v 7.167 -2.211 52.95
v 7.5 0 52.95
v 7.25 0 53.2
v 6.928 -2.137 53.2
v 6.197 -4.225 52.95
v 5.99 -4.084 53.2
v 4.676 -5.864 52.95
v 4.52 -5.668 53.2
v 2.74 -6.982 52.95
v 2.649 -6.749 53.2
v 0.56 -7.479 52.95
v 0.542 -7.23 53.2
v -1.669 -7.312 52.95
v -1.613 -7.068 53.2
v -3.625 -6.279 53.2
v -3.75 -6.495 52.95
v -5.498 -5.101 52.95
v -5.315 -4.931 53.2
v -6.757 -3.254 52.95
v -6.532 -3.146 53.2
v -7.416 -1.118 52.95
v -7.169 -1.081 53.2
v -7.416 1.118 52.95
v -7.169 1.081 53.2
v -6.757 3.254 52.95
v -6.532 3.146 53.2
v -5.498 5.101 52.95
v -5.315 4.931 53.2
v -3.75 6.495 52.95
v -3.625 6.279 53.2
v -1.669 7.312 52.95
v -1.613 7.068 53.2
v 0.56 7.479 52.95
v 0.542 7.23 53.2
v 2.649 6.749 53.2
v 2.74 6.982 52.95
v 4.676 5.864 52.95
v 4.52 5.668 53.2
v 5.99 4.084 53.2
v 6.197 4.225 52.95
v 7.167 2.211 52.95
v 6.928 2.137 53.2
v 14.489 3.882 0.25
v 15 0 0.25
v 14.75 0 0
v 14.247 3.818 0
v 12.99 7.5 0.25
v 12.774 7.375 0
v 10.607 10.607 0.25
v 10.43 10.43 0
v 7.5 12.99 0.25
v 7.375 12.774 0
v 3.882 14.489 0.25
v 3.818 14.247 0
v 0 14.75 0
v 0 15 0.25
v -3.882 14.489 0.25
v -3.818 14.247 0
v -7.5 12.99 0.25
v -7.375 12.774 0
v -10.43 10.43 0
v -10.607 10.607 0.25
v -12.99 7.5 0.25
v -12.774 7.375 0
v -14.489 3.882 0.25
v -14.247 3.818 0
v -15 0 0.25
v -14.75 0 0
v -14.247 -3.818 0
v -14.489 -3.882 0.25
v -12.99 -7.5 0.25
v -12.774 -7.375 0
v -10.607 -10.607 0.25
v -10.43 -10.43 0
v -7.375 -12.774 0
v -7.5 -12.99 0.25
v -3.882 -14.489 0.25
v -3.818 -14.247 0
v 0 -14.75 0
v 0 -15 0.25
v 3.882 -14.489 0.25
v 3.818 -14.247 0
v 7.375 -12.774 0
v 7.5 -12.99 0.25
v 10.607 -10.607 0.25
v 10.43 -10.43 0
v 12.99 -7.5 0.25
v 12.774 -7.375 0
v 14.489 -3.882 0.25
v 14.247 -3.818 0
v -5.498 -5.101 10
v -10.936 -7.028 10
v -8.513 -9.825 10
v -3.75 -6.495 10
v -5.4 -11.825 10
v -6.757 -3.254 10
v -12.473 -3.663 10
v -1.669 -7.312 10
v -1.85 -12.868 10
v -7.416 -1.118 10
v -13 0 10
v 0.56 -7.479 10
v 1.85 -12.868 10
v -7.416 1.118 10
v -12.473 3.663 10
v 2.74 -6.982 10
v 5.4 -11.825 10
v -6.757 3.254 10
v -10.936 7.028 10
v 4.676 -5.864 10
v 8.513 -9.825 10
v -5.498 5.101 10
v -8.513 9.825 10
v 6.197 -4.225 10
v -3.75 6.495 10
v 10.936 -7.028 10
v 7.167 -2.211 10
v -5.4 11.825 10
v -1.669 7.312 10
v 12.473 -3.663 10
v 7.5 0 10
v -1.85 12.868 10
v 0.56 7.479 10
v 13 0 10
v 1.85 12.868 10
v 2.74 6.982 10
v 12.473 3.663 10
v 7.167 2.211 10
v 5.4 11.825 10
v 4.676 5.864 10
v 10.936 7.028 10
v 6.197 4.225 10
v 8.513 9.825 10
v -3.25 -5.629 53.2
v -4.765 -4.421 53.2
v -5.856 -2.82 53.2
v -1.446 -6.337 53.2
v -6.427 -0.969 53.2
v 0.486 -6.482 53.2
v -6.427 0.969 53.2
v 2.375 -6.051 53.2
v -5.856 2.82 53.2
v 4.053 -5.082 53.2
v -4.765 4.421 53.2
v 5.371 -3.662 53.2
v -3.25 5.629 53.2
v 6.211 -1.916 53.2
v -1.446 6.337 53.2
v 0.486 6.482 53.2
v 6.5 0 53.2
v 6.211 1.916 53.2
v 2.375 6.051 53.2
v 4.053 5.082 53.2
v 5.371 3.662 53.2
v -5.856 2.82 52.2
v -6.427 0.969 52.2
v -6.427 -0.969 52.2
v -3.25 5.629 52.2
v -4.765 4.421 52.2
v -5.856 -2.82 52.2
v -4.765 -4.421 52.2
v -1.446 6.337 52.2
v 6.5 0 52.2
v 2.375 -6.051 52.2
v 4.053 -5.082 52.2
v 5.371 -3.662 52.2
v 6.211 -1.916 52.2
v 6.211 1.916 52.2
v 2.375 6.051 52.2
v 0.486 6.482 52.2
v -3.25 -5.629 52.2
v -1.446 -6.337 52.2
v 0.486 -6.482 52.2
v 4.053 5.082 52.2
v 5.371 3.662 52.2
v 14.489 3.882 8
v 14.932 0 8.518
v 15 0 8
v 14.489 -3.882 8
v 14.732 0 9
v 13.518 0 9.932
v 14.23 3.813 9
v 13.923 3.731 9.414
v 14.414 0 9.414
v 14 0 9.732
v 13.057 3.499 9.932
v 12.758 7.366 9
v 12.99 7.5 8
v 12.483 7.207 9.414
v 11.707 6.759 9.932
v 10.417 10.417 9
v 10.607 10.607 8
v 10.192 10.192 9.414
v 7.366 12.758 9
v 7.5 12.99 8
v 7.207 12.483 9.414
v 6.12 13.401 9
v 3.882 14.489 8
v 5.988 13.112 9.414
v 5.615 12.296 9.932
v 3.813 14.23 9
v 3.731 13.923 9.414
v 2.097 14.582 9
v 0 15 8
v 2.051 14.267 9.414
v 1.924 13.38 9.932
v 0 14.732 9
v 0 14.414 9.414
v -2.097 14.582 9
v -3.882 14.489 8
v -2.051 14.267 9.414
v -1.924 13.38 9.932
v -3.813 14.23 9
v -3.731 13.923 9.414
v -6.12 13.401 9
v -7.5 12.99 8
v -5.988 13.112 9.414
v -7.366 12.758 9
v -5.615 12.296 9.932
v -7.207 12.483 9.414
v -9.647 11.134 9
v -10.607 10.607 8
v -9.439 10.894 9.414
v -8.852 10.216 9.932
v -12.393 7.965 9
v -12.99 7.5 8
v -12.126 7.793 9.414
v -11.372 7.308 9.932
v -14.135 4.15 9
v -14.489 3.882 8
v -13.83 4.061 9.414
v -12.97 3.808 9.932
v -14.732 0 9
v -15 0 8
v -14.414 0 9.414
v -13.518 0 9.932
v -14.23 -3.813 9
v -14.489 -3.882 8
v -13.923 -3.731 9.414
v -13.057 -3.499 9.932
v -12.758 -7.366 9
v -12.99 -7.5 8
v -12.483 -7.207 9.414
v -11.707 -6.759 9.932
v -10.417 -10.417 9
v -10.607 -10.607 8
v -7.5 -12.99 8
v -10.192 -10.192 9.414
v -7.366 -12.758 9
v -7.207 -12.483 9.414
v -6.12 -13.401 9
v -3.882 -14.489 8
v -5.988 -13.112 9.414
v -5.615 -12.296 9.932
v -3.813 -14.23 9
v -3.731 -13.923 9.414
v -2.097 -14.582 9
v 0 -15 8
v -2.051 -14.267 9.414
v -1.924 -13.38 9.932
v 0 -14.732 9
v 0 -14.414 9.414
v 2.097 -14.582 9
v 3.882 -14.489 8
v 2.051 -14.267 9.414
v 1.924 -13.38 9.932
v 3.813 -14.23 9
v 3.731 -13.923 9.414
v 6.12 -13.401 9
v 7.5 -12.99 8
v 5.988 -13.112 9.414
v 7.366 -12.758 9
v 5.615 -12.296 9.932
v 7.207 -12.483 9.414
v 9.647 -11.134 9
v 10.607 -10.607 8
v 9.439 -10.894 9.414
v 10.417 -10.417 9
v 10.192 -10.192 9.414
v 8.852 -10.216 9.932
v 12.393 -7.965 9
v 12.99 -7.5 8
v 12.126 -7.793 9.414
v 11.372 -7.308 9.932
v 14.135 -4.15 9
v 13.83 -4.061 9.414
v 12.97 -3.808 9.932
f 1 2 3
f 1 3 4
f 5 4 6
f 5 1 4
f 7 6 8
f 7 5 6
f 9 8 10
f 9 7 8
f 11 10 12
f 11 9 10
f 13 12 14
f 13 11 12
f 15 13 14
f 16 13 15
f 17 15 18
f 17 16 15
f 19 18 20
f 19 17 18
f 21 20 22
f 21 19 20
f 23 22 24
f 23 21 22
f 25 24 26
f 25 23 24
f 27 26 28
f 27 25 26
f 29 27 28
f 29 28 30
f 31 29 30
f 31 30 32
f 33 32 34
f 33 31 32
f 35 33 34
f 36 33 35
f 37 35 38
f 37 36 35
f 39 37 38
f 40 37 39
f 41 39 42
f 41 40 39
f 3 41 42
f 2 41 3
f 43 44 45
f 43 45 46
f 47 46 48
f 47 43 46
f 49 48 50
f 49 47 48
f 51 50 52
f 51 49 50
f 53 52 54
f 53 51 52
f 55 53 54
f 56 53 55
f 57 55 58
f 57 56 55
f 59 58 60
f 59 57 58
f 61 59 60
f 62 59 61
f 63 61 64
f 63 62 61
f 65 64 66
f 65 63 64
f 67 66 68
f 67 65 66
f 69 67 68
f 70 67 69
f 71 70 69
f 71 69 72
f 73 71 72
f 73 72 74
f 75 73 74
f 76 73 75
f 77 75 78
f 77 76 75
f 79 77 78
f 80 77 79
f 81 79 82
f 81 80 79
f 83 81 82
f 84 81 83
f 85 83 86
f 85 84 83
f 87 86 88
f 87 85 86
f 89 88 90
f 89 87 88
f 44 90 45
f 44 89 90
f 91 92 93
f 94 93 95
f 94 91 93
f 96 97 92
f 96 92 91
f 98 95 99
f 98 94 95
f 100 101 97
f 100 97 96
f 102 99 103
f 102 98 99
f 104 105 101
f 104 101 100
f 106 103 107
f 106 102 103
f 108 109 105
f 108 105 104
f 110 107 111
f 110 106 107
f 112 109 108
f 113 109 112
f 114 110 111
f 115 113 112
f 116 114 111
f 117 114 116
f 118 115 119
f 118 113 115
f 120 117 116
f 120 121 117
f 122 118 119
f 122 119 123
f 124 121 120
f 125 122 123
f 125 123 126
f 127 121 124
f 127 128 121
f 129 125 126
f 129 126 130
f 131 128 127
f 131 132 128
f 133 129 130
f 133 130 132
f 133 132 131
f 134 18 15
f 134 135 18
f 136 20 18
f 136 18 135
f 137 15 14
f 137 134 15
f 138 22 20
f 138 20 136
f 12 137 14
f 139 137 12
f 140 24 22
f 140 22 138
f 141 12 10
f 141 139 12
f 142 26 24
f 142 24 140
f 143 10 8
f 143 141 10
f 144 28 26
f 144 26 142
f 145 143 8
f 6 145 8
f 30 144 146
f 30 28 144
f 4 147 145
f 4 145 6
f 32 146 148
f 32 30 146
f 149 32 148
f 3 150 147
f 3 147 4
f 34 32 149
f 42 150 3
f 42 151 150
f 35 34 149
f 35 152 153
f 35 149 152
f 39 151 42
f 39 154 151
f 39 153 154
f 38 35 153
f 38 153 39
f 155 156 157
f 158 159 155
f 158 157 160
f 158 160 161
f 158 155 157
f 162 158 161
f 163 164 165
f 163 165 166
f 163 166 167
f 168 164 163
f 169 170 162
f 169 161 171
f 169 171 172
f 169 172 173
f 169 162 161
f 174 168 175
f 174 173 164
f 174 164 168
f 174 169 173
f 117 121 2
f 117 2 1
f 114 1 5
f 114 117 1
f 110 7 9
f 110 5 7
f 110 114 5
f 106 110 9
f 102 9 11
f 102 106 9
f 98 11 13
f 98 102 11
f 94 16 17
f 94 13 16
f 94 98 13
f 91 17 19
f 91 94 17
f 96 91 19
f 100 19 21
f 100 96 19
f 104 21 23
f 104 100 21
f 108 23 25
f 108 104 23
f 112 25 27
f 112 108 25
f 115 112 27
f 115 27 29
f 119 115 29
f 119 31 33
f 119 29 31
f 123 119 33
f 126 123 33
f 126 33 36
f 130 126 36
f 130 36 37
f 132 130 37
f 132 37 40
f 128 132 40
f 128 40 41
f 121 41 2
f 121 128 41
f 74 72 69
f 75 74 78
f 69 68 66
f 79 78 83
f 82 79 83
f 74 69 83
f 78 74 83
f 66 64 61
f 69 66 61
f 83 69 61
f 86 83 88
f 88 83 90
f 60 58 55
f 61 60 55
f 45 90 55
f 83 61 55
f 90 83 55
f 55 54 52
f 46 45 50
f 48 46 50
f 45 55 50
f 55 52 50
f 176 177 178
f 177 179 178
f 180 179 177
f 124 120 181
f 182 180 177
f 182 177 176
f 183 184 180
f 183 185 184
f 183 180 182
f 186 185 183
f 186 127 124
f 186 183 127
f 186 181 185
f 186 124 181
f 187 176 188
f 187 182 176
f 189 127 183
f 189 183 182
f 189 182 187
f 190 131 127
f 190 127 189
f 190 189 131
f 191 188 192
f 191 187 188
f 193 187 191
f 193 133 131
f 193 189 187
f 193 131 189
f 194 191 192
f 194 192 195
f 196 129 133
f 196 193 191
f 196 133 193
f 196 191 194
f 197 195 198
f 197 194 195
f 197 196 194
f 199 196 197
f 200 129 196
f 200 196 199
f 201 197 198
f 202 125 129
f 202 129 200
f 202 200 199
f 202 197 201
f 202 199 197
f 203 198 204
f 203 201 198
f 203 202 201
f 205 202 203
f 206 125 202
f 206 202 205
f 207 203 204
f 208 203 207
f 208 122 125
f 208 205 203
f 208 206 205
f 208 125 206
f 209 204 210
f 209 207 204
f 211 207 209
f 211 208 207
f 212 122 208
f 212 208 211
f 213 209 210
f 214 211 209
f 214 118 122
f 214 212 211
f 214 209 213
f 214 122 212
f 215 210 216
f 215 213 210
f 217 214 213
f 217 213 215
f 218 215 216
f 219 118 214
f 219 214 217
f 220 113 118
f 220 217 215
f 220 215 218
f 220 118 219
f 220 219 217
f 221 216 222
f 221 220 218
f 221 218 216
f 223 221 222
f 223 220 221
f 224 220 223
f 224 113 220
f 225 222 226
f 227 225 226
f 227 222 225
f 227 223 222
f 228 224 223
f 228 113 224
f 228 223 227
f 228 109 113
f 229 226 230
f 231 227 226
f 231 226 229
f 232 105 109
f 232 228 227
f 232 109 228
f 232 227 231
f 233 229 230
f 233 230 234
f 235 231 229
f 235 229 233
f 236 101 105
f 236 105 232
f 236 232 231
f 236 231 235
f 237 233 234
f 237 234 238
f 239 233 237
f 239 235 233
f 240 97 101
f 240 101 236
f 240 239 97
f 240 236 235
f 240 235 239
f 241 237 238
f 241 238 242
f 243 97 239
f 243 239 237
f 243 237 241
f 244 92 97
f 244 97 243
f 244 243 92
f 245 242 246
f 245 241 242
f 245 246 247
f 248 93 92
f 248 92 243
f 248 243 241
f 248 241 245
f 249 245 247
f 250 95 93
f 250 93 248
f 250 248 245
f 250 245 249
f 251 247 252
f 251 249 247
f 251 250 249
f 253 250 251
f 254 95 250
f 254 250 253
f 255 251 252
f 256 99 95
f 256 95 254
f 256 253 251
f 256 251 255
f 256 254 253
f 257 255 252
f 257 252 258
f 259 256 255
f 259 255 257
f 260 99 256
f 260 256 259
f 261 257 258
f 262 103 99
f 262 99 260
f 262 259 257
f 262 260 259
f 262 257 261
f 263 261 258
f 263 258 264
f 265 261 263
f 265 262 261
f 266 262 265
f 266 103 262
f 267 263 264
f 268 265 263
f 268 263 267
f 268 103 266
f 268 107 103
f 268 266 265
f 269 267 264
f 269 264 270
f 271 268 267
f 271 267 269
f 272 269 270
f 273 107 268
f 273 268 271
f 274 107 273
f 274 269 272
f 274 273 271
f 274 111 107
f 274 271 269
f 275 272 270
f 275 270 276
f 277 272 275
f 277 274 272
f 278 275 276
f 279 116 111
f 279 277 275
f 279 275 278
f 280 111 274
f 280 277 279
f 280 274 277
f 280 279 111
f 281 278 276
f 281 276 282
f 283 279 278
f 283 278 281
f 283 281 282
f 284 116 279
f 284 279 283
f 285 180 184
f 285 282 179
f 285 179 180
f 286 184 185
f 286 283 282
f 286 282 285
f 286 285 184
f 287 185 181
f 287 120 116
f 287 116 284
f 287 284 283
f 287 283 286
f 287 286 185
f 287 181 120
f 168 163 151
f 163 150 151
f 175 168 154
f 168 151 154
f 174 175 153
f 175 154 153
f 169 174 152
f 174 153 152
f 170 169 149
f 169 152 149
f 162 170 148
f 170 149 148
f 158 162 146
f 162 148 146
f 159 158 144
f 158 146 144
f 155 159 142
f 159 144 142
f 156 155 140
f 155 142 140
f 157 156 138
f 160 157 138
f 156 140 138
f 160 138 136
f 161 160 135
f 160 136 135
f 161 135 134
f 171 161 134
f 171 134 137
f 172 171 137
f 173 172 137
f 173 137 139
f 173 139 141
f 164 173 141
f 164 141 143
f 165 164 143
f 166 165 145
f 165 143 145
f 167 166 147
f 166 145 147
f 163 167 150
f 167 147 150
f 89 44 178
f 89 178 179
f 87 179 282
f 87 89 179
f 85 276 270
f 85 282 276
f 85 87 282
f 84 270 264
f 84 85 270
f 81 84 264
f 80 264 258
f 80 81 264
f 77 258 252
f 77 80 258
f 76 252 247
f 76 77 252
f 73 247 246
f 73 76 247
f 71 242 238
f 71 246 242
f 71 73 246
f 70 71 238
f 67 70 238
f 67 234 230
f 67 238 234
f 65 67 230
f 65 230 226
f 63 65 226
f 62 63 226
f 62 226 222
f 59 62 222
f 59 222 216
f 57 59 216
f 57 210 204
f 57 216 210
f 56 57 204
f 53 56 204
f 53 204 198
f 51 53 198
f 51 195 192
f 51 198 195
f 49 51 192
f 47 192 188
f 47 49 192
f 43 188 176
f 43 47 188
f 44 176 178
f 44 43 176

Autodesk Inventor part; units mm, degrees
ref_plane "YZ Plane" through (0, 0, 0) normal (1, 0, 0) x (0, 1, 0)
ref_plane "XZ Plane" through (0, 0, 0) normal (0, 1, 0) x (-1, 0, 0)
ref_plane "XY Plane" through (0, 0, 0) normal (0, 0, 1) x (1, 0, 0)
sketch "Sketch1" plane through (0, 0, 0) normal (0, 0, 1) x (1, 0, 0)
  circle A0 centre (0, 0) radius 15
  dimension "d0" = 30
extrude "Extrusion1" add sketch "Sketch1" along normal blind 10
sketch "Sketch2" plane through (0, 0, 10) normal (0, 0, 1) x (1, 0, 0)
  circle A0 centre (0, 0) radius 15 projected
  circle A1 centre (0, 0) radius 7.5
  dimension "d3" = 15
extrude "Extrusion2" add sketch "Sketch2" along normal blind 43.2 contours A1
sketch "Sketch3" plane through (0, 0, 53.2) normal (0, 0, 1) x (1, 0, 0)
  circle A0 centre (0, 0) radius 7.5 projected
  circle A1 centre (0, 0) radius 6.5
  dimension "d6" = 1
extrude "Extrusion3" cut sketch "Sketch3" against normal blind 1 contours A1
fillet "Fillet1" radius 2 1 edges at (-15, 0, 10)
chamfer "Chamfer1" distance 0.25 angle 45 1 edges at (-7.5, 0, 53.2)
chamfer "Chamfer2" distance 0.25 angle 45 1 edges at (-15, 0, 0)
properties part number "InfiniStix_066x"
